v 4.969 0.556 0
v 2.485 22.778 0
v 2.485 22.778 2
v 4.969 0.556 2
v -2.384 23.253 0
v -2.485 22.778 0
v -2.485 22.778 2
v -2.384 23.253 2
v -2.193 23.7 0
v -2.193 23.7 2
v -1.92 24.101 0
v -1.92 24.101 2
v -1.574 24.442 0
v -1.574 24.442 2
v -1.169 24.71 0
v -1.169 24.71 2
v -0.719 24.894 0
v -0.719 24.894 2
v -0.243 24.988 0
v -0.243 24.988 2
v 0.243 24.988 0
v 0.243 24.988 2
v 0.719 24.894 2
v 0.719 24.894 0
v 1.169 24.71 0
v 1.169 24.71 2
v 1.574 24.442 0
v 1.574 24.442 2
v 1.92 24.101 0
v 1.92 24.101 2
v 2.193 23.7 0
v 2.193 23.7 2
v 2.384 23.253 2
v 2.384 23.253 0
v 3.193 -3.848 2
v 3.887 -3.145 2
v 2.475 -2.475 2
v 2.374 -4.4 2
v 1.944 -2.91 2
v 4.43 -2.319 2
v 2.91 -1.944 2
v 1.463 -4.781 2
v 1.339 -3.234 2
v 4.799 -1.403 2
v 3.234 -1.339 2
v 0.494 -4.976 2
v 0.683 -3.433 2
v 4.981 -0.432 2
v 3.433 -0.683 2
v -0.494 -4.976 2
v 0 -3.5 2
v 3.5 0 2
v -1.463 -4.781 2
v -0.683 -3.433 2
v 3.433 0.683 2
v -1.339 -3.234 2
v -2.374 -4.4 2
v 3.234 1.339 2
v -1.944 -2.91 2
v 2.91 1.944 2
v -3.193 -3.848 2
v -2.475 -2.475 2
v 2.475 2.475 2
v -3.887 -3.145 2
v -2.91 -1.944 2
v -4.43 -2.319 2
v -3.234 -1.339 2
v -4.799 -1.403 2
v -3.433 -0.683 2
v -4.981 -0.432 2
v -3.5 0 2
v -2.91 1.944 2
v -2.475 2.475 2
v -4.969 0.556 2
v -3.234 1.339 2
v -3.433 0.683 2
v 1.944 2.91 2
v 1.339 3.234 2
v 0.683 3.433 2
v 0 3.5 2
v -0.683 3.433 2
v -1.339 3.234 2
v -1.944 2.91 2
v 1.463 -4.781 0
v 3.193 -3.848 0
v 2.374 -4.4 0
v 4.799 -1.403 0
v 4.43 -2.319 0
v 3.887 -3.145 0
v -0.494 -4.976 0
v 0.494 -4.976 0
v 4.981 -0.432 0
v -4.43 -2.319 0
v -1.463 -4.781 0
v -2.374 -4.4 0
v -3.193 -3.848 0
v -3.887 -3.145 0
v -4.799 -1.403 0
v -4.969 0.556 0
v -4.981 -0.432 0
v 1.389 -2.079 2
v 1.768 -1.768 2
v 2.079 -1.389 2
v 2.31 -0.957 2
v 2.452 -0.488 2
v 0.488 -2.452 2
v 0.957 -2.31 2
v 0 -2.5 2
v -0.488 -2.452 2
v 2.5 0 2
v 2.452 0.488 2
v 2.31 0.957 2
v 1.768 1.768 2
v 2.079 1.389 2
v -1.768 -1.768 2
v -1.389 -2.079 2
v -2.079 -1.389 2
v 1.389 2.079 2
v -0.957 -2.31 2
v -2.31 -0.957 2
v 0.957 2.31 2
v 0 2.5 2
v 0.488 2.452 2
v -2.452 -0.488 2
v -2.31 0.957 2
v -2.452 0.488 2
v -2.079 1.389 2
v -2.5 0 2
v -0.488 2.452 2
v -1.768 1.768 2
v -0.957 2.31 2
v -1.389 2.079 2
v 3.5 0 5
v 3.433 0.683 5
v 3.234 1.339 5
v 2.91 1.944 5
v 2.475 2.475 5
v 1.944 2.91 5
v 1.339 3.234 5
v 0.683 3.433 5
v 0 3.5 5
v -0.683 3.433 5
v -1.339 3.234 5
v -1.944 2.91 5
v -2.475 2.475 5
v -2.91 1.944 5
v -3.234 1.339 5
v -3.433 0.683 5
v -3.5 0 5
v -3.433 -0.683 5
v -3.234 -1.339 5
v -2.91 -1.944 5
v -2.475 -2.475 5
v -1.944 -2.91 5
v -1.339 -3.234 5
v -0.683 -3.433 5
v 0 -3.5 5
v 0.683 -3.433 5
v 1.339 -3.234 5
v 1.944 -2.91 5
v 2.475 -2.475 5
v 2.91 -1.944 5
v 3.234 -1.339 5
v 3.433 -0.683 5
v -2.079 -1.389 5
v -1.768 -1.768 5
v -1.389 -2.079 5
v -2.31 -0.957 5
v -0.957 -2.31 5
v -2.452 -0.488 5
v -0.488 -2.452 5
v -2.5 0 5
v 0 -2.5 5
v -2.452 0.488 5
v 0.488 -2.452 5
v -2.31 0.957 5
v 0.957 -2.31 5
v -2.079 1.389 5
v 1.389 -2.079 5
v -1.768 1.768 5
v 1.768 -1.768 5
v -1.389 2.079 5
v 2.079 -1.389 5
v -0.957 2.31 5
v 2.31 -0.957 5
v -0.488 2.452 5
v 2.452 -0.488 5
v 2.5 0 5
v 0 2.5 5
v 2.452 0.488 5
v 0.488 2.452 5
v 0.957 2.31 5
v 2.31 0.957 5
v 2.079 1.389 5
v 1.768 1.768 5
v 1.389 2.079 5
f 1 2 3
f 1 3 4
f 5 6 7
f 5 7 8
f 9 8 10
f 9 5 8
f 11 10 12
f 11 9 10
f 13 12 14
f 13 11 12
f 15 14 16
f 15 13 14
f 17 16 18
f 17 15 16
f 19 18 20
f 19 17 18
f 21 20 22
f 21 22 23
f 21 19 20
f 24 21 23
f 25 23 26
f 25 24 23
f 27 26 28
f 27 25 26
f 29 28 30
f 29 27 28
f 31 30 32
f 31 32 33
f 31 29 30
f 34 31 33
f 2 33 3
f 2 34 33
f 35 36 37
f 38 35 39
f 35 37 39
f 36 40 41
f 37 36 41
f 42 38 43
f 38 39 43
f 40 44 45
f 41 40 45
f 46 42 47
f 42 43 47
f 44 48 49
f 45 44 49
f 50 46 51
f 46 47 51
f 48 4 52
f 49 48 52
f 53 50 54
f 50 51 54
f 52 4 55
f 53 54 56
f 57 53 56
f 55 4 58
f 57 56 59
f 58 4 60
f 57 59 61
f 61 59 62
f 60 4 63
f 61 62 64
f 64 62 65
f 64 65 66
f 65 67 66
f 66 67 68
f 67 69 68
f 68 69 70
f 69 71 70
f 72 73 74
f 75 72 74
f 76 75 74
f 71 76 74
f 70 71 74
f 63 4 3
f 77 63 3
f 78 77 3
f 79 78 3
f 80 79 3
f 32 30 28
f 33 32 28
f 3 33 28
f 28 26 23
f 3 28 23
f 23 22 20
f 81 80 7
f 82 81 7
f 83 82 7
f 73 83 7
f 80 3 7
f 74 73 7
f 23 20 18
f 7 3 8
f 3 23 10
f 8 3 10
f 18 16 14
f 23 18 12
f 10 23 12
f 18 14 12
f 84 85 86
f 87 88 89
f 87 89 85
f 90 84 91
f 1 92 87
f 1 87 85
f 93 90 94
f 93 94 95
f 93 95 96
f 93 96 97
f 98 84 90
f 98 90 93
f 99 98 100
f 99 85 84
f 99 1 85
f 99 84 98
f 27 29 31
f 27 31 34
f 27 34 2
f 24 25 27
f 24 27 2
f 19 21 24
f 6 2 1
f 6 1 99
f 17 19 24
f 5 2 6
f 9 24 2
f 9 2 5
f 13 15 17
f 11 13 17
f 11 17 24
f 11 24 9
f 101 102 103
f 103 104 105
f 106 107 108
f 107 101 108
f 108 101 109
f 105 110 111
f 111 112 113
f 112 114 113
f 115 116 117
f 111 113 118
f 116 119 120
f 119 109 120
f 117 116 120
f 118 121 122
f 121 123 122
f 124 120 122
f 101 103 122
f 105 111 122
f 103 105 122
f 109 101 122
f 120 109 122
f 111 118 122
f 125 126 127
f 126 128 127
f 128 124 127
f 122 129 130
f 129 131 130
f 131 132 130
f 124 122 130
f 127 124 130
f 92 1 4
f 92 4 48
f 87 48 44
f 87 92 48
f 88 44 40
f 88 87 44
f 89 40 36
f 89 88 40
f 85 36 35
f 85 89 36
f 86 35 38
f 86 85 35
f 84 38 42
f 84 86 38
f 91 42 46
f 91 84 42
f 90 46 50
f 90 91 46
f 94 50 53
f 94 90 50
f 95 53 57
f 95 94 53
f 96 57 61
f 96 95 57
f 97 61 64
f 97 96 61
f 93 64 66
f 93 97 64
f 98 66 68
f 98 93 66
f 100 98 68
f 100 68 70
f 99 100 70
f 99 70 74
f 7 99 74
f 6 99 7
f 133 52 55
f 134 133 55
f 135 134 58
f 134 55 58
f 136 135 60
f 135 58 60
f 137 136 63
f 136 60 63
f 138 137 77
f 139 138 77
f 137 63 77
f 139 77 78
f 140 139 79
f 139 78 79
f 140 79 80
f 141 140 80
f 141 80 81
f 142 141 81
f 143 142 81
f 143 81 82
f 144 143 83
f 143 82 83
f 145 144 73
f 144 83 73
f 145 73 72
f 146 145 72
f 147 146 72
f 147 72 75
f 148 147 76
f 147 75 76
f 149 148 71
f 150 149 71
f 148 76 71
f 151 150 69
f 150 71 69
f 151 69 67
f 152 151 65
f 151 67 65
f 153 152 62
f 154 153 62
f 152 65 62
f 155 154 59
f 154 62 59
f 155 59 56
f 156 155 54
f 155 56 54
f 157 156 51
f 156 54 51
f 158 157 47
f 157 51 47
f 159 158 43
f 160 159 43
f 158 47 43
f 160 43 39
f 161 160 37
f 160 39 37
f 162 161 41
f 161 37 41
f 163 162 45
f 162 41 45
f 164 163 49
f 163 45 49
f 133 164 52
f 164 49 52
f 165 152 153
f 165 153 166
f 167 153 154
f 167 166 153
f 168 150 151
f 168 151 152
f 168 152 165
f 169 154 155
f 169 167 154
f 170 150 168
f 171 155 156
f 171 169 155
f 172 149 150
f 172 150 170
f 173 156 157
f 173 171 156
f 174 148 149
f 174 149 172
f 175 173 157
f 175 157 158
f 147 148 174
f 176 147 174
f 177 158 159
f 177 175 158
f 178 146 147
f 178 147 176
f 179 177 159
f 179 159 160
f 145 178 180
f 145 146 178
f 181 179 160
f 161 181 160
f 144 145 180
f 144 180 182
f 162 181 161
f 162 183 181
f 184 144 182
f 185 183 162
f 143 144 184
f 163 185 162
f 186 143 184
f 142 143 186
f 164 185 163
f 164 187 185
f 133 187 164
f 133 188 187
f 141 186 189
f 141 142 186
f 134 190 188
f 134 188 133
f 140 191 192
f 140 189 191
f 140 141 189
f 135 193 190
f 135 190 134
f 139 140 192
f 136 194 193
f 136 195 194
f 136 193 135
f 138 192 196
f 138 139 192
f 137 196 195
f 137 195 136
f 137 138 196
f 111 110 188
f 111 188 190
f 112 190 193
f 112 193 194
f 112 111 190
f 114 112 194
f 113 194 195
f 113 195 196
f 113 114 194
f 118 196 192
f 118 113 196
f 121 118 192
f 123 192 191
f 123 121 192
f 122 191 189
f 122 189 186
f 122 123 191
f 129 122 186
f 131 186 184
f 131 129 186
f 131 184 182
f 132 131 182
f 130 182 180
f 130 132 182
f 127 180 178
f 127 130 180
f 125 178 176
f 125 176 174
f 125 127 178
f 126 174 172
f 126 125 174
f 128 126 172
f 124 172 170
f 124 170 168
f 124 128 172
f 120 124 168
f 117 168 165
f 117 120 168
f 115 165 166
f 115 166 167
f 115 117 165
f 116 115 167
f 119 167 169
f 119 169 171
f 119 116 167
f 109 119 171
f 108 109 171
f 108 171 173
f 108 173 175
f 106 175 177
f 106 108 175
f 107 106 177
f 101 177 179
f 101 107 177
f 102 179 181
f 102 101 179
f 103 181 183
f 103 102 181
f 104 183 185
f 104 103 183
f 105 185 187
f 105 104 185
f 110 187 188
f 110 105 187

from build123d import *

# Parameters (mm, degrees)
EXTRUDE_1_DEPTH = 2
SKETCH_2_R      = 3.5
SKETCH_2_R_2    = 2.5
EXTRUDE_2_DEPTH = 3


with BuildPart() as part:
    # 草图1 → 凸台-拉伸1 (new body)
    with BuildSketch(Plane.XY):
        with BuildLine():
            Line((-4.96903995, 0.555555556), (-2.484519975, 22.777777778))
            ThreePointArc((-2.484519975, 22.777777778), (0, 25), (2.484519975, 22.777777778))
            Line((2.484519975, 22.777777778), (4.96903995, 0.555555556))
            ThreePointArc((4.96903995, 0.555555556), (0, -5), (-4.96903995, 0.555555556))
        make_face()
    extrude(amount=EXTRUDE_1_DEPTH)

    # 草图2 → 凸台-拉伸2 (add)
    with BuildSketch(Plane.XY.offset(2)):
        Circle(SKETCH_2_R)
        Circle(SKETCH_2_R_2, mode=Mode.SUBTRACT)
    extrude(amount=EXTRUDE_2_DEPTH)


solid = part.part
